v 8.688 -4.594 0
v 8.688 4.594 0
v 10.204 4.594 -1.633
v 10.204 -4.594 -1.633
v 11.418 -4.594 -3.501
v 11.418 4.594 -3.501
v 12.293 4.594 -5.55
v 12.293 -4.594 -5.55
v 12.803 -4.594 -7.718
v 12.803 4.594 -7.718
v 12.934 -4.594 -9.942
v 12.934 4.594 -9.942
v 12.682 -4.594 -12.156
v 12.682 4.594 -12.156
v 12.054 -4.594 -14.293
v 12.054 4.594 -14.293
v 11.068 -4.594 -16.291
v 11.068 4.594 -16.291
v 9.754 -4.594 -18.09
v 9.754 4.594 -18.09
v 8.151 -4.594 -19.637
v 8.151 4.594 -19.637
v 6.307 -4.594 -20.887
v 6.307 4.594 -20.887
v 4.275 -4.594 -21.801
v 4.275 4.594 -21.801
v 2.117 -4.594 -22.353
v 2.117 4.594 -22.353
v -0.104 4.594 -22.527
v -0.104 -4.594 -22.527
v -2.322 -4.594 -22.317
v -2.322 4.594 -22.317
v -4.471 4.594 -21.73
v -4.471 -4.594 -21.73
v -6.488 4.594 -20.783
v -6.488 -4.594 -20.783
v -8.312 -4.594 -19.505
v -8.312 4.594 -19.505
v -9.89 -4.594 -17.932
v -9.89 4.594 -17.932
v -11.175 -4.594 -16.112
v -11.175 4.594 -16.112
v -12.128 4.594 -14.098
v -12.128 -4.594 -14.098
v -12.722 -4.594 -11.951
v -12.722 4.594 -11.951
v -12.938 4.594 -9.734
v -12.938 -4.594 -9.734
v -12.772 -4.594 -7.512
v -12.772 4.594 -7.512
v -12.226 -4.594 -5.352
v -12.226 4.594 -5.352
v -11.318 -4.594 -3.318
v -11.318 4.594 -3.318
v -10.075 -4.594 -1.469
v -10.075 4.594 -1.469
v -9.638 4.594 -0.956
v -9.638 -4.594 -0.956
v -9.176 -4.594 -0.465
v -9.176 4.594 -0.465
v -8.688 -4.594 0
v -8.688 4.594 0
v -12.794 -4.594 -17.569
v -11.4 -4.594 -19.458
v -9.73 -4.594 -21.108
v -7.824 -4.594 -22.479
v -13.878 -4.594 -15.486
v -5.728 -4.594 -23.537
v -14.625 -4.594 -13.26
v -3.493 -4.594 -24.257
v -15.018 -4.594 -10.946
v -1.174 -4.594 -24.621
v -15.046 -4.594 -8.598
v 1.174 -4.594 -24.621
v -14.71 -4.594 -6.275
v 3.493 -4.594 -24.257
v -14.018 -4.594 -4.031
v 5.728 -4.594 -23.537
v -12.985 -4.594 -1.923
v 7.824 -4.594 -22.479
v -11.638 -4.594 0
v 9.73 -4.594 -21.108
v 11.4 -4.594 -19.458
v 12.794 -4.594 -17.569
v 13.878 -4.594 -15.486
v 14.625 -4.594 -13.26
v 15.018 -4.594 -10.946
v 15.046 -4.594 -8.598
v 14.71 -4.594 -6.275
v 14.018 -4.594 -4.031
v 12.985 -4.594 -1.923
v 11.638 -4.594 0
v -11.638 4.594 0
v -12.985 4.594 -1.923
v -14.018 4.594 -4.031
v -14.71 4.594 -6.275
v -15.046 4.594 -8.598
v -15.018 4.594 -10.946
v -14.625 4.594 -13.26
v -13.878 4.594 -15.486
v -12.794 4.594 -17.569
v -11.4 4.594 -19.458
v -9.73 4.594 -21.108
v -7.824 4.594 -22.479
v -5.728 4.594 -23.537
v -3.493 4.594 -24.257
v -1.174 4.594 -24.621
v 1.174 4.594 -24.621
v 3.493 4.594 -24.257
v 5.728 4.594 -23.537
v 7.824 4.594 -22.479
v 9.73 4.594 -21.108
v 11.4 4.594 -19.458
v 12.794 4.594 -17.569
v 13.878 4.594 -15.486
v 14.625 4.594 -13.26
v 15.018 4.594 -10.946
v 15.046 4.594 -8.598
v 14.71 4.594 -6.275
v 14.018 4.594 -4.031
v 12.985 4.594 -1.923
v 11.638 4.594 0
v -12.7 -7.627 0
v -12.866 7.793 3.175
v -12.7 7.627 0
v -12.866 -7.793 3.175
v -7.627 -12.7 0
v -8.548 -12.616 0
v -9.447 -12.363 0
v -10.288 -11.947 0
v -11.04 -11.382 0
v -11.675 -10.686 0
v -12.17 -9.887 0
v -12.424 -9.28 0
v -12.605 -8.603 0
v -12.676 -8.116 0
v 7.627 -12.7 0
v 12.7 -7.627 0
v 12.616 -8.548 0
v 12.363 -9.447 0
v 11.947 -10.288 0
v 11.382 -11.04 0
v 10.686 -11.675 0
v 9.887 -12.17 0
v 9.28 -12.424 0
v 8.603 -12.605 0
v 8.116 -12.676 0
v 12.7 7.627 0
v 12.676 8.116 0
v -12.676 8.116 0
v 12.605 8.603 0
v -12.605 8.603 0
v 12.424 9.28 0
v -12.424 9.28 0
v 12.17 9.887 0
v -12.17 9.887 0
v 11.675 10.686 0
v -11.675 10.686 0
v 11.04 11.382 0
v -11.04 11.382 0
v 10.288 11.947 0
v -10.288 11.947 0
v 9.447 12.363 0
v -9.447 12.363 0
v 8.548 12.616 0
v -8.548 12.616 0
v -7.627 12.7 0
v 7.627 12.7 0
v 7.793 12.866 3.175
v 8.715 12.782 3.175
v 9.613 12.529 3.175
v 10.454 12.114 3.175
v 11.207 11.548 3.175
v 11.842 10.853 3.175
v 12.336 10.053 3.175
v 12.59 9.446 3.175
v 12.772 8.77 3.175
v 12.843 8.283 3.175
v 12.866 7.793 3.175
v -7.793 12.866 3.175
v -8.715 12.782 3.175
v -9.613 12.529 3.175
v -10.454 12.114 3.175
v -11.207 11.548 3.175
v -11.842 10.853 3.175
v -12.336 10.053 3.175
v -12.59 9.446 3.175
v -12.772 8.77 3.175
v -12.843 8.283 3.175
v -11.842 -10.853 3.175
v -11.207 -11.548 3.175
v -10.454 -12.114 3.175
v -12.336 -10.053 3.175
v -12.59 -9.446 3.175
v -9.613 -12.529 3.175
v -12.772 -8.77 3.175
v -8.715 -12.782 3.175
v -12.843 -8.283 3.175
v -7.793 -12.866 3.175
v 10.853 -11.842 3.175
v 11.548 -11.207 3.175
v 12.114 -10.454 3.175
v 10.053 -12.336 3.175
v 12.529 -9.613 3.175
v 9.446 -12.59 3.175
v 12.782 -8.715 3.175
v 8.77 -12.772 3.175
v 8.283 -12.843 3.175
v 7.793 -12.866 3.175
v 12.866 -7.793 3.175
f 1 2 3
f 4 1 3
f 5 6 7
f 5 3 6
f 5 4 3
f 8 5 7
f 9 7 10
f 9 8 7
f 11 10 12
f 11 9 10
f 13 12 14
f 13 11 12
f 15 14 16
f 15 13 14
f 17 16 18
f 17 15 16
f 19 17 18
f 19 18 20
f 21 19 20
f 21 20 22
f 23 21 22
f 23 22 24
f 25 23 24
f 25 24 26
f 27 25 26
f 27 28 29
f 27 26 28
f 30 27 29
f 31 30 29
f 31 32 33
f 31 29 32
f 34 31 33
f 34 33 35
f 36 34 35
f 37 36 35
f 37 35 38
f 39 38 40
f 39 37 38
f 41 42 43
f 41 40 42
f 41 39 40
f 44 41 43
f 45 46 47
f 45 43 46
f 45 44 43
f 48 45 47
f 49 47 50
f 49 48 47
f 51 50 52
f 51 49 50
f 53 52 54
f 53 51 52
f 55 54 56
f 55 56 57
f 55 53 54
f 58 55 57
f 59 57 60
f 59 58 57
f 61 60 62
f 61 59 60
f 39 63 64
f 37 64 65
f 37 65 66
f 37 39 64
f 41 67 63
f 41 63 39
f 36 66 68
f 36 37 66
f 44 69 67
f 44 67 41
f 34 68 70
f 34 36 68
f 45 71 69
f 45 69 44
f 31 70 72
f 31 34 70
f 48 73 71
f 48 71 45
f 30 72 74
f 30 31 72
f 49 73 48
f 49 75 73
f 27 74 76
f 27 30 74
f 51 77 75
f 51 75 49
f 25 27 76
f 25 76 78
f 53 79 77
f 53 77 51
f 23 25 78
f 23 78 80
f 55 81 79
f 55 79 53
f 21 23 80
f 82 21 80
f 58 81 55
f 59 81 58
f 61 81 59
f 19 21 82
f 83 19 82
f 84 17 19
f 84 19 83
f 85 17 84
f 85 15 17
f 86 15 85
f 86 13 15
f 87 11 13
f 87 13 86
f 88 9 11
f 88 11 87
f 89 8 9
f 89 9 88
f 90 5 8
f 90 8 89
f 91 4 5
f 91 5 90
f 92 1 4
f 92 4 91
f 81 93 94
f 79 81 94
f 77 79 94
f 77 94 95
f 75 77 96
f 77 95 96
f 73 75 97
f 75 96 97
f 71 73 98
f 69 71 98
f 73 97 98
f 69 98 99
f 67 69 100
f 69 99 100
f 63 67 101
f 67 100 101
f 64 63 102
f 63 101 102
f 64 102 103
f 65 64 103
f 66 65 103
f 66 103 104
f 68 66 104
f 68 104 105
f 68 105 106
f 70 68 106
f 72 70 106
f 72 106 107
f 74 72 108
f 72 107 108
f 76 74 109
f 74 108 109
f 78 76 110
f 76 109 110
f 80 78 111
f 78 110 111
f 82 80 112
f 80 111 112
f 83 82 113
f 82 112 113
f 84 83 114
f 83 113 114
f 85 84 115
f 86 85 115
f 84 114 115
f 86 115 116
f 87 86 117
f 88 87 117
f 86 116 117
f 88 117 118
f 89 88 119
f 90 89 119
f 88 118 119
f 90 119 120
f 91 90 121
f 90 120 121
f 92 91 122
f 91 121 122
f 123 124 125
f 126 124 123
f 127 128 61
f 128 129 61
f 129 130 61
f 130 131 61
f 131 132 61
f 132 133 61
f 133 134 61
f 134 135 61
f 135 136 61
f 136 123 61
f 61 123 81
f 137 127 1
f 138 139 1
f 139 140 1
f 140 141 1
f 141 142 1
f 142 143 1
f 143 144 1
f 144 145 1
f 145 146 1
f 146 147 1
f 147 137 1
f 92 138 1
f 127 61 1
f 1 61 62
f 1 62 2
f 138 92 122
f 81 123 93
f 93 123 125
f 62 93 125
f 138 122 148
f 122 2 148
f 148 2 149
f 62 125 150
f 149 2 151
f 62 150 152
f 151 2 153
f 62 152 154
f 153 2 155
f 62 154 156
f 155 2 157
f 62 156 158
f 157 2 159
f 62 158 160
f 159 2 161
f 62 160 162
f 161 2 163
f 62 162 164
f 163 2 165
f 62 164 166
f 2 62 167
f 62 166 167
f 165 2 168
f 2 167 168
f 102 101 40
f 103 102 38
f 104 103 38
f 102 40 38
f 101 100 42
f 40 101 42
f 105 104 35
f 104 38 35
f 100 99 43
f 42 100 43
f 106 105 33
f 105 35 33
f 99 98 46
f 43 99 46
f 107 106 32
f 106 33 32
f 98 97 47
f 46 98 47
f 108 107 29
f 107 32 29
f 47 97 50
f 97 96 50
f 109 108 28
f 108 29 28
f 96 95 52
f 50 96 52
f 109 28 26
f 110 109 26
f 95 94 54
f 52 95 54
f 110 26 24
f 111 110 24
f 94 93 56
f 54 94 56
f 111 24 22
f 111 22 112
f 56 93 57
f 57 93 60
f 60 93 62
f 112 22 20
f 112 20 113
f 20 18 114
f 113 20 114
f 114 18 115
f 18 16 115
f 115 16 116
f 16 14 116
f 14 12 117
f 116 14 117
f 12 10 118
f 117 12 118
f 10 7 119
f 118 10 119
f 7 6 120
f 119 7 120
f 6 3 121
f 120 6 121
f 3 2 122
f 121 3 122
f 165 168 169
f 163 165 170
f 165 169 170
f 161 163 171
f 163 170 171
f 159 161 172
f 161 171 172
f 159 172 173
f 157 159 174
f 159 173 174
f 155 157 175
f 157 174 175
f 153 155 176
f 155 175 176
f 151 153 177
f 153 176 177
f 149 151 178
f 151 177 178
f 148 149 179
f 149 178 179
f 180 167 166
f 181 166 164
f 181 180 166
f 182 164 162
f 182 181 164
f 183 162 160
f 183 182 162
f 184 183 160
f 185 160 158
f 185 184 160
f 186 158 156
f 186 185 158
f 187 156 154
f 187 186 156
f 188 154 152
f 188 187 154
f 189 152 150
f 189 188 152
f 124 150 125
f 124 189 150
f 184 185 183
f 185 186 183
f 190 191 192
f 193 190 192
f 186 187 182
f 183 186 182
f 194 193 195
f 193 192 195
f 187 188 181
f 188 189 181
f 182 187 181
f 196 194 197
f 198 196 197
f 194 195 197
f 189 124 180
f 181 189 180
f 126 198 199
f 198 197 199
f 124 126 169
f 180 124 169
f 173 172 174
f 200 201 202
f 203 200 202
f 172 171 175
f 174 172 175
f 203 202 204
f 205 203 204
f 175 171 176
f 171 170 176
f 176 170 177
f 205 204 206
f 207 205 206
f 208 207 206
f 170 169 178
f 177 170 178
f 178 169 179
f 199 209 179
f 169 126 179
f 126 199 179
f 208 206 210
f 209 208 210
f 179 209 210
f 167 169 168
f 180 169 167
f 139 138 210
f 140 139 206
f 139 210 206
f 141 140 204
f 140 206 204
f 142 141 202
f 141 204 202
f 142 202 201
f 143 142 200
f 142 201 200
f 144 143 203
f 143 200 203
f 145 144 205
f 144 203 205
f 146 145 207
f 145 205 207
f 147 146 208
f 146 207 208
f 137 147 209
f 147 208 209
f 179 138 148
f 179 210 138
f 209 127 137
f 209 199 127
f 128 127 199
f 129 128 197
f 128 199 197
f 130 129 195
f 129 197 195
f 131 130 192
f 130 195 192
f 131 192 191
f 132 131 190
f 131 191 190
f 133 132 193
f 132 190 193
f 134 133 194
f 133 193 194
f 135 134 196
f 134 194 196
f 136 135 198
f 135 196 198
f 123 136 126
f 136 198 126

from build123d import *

# Parameters (mm, degrees)
F0_W          = 25.4
F0_H          = 25.4
F1_DEPTH      = 3.175
F1_TAPER      = -3
F3_W          = 2.9493607581
F3_H          = 9.1879377142
F6_DEPTH      = 4.5939688571
F6_DEPTH_BACK = 4.5939688571
F7_R          = 5.08


with BuildPart() as f1:
    # F0 (on Top) → F1 (new body)
    with BuildSketch(Plane.XY):
        Rectangle(F0_W, F0_H)
    extrude(amount=F1_DEPTH, taper=F1_TAPER)

    # F4: sweep along a path in F2
    with BuildLine(Plane.XZ) as f4_path:
        ThreePointArc((-10.16, 0), (0, -23.5582897328), (10.16, 0))
    # F3 (on face) → F4 (sweep)
    with BuildSketch(Plane.XY):
        with Locations((10.1631330326, 0)):
            Rectangle(F3_W, F3_H)
    sweep(path=f4_path.line)

    # F5 (on Front) → F6 (join, two sides)
    with BuildSketch(Plane.XZ) as f6_sk:
        with BuildLine():
            Line((-10.16, 0), (-10.0748691618, -1.4690828204))
            ThreePointArc((-10.0748691618, -1.4690828204), (-9.4103726, -0.7074453448), (-8.6884526536, 0))
            Line((-8.6884526536, 0), (-10.16, 0))
        make_face()
    extrude(amount=F6_DEPTH)
    extrude(f6_sk.sketch, amount=-F6_DEPTH_BACK)

    # F7
    f7_edges = [f1.edges().sort_by_distance(p)[0] for p in [
        (-12.783197, 12.783197, 1.5875),
        (-12.783197, -12.783197, 1.5875),
        (12.783197, -12.783197, 1.5875),
        (12.783197, 12.783197, 1.5875),
    ]]
    fillet(f7_edges, radius=F7_R)


solid = f1.part
